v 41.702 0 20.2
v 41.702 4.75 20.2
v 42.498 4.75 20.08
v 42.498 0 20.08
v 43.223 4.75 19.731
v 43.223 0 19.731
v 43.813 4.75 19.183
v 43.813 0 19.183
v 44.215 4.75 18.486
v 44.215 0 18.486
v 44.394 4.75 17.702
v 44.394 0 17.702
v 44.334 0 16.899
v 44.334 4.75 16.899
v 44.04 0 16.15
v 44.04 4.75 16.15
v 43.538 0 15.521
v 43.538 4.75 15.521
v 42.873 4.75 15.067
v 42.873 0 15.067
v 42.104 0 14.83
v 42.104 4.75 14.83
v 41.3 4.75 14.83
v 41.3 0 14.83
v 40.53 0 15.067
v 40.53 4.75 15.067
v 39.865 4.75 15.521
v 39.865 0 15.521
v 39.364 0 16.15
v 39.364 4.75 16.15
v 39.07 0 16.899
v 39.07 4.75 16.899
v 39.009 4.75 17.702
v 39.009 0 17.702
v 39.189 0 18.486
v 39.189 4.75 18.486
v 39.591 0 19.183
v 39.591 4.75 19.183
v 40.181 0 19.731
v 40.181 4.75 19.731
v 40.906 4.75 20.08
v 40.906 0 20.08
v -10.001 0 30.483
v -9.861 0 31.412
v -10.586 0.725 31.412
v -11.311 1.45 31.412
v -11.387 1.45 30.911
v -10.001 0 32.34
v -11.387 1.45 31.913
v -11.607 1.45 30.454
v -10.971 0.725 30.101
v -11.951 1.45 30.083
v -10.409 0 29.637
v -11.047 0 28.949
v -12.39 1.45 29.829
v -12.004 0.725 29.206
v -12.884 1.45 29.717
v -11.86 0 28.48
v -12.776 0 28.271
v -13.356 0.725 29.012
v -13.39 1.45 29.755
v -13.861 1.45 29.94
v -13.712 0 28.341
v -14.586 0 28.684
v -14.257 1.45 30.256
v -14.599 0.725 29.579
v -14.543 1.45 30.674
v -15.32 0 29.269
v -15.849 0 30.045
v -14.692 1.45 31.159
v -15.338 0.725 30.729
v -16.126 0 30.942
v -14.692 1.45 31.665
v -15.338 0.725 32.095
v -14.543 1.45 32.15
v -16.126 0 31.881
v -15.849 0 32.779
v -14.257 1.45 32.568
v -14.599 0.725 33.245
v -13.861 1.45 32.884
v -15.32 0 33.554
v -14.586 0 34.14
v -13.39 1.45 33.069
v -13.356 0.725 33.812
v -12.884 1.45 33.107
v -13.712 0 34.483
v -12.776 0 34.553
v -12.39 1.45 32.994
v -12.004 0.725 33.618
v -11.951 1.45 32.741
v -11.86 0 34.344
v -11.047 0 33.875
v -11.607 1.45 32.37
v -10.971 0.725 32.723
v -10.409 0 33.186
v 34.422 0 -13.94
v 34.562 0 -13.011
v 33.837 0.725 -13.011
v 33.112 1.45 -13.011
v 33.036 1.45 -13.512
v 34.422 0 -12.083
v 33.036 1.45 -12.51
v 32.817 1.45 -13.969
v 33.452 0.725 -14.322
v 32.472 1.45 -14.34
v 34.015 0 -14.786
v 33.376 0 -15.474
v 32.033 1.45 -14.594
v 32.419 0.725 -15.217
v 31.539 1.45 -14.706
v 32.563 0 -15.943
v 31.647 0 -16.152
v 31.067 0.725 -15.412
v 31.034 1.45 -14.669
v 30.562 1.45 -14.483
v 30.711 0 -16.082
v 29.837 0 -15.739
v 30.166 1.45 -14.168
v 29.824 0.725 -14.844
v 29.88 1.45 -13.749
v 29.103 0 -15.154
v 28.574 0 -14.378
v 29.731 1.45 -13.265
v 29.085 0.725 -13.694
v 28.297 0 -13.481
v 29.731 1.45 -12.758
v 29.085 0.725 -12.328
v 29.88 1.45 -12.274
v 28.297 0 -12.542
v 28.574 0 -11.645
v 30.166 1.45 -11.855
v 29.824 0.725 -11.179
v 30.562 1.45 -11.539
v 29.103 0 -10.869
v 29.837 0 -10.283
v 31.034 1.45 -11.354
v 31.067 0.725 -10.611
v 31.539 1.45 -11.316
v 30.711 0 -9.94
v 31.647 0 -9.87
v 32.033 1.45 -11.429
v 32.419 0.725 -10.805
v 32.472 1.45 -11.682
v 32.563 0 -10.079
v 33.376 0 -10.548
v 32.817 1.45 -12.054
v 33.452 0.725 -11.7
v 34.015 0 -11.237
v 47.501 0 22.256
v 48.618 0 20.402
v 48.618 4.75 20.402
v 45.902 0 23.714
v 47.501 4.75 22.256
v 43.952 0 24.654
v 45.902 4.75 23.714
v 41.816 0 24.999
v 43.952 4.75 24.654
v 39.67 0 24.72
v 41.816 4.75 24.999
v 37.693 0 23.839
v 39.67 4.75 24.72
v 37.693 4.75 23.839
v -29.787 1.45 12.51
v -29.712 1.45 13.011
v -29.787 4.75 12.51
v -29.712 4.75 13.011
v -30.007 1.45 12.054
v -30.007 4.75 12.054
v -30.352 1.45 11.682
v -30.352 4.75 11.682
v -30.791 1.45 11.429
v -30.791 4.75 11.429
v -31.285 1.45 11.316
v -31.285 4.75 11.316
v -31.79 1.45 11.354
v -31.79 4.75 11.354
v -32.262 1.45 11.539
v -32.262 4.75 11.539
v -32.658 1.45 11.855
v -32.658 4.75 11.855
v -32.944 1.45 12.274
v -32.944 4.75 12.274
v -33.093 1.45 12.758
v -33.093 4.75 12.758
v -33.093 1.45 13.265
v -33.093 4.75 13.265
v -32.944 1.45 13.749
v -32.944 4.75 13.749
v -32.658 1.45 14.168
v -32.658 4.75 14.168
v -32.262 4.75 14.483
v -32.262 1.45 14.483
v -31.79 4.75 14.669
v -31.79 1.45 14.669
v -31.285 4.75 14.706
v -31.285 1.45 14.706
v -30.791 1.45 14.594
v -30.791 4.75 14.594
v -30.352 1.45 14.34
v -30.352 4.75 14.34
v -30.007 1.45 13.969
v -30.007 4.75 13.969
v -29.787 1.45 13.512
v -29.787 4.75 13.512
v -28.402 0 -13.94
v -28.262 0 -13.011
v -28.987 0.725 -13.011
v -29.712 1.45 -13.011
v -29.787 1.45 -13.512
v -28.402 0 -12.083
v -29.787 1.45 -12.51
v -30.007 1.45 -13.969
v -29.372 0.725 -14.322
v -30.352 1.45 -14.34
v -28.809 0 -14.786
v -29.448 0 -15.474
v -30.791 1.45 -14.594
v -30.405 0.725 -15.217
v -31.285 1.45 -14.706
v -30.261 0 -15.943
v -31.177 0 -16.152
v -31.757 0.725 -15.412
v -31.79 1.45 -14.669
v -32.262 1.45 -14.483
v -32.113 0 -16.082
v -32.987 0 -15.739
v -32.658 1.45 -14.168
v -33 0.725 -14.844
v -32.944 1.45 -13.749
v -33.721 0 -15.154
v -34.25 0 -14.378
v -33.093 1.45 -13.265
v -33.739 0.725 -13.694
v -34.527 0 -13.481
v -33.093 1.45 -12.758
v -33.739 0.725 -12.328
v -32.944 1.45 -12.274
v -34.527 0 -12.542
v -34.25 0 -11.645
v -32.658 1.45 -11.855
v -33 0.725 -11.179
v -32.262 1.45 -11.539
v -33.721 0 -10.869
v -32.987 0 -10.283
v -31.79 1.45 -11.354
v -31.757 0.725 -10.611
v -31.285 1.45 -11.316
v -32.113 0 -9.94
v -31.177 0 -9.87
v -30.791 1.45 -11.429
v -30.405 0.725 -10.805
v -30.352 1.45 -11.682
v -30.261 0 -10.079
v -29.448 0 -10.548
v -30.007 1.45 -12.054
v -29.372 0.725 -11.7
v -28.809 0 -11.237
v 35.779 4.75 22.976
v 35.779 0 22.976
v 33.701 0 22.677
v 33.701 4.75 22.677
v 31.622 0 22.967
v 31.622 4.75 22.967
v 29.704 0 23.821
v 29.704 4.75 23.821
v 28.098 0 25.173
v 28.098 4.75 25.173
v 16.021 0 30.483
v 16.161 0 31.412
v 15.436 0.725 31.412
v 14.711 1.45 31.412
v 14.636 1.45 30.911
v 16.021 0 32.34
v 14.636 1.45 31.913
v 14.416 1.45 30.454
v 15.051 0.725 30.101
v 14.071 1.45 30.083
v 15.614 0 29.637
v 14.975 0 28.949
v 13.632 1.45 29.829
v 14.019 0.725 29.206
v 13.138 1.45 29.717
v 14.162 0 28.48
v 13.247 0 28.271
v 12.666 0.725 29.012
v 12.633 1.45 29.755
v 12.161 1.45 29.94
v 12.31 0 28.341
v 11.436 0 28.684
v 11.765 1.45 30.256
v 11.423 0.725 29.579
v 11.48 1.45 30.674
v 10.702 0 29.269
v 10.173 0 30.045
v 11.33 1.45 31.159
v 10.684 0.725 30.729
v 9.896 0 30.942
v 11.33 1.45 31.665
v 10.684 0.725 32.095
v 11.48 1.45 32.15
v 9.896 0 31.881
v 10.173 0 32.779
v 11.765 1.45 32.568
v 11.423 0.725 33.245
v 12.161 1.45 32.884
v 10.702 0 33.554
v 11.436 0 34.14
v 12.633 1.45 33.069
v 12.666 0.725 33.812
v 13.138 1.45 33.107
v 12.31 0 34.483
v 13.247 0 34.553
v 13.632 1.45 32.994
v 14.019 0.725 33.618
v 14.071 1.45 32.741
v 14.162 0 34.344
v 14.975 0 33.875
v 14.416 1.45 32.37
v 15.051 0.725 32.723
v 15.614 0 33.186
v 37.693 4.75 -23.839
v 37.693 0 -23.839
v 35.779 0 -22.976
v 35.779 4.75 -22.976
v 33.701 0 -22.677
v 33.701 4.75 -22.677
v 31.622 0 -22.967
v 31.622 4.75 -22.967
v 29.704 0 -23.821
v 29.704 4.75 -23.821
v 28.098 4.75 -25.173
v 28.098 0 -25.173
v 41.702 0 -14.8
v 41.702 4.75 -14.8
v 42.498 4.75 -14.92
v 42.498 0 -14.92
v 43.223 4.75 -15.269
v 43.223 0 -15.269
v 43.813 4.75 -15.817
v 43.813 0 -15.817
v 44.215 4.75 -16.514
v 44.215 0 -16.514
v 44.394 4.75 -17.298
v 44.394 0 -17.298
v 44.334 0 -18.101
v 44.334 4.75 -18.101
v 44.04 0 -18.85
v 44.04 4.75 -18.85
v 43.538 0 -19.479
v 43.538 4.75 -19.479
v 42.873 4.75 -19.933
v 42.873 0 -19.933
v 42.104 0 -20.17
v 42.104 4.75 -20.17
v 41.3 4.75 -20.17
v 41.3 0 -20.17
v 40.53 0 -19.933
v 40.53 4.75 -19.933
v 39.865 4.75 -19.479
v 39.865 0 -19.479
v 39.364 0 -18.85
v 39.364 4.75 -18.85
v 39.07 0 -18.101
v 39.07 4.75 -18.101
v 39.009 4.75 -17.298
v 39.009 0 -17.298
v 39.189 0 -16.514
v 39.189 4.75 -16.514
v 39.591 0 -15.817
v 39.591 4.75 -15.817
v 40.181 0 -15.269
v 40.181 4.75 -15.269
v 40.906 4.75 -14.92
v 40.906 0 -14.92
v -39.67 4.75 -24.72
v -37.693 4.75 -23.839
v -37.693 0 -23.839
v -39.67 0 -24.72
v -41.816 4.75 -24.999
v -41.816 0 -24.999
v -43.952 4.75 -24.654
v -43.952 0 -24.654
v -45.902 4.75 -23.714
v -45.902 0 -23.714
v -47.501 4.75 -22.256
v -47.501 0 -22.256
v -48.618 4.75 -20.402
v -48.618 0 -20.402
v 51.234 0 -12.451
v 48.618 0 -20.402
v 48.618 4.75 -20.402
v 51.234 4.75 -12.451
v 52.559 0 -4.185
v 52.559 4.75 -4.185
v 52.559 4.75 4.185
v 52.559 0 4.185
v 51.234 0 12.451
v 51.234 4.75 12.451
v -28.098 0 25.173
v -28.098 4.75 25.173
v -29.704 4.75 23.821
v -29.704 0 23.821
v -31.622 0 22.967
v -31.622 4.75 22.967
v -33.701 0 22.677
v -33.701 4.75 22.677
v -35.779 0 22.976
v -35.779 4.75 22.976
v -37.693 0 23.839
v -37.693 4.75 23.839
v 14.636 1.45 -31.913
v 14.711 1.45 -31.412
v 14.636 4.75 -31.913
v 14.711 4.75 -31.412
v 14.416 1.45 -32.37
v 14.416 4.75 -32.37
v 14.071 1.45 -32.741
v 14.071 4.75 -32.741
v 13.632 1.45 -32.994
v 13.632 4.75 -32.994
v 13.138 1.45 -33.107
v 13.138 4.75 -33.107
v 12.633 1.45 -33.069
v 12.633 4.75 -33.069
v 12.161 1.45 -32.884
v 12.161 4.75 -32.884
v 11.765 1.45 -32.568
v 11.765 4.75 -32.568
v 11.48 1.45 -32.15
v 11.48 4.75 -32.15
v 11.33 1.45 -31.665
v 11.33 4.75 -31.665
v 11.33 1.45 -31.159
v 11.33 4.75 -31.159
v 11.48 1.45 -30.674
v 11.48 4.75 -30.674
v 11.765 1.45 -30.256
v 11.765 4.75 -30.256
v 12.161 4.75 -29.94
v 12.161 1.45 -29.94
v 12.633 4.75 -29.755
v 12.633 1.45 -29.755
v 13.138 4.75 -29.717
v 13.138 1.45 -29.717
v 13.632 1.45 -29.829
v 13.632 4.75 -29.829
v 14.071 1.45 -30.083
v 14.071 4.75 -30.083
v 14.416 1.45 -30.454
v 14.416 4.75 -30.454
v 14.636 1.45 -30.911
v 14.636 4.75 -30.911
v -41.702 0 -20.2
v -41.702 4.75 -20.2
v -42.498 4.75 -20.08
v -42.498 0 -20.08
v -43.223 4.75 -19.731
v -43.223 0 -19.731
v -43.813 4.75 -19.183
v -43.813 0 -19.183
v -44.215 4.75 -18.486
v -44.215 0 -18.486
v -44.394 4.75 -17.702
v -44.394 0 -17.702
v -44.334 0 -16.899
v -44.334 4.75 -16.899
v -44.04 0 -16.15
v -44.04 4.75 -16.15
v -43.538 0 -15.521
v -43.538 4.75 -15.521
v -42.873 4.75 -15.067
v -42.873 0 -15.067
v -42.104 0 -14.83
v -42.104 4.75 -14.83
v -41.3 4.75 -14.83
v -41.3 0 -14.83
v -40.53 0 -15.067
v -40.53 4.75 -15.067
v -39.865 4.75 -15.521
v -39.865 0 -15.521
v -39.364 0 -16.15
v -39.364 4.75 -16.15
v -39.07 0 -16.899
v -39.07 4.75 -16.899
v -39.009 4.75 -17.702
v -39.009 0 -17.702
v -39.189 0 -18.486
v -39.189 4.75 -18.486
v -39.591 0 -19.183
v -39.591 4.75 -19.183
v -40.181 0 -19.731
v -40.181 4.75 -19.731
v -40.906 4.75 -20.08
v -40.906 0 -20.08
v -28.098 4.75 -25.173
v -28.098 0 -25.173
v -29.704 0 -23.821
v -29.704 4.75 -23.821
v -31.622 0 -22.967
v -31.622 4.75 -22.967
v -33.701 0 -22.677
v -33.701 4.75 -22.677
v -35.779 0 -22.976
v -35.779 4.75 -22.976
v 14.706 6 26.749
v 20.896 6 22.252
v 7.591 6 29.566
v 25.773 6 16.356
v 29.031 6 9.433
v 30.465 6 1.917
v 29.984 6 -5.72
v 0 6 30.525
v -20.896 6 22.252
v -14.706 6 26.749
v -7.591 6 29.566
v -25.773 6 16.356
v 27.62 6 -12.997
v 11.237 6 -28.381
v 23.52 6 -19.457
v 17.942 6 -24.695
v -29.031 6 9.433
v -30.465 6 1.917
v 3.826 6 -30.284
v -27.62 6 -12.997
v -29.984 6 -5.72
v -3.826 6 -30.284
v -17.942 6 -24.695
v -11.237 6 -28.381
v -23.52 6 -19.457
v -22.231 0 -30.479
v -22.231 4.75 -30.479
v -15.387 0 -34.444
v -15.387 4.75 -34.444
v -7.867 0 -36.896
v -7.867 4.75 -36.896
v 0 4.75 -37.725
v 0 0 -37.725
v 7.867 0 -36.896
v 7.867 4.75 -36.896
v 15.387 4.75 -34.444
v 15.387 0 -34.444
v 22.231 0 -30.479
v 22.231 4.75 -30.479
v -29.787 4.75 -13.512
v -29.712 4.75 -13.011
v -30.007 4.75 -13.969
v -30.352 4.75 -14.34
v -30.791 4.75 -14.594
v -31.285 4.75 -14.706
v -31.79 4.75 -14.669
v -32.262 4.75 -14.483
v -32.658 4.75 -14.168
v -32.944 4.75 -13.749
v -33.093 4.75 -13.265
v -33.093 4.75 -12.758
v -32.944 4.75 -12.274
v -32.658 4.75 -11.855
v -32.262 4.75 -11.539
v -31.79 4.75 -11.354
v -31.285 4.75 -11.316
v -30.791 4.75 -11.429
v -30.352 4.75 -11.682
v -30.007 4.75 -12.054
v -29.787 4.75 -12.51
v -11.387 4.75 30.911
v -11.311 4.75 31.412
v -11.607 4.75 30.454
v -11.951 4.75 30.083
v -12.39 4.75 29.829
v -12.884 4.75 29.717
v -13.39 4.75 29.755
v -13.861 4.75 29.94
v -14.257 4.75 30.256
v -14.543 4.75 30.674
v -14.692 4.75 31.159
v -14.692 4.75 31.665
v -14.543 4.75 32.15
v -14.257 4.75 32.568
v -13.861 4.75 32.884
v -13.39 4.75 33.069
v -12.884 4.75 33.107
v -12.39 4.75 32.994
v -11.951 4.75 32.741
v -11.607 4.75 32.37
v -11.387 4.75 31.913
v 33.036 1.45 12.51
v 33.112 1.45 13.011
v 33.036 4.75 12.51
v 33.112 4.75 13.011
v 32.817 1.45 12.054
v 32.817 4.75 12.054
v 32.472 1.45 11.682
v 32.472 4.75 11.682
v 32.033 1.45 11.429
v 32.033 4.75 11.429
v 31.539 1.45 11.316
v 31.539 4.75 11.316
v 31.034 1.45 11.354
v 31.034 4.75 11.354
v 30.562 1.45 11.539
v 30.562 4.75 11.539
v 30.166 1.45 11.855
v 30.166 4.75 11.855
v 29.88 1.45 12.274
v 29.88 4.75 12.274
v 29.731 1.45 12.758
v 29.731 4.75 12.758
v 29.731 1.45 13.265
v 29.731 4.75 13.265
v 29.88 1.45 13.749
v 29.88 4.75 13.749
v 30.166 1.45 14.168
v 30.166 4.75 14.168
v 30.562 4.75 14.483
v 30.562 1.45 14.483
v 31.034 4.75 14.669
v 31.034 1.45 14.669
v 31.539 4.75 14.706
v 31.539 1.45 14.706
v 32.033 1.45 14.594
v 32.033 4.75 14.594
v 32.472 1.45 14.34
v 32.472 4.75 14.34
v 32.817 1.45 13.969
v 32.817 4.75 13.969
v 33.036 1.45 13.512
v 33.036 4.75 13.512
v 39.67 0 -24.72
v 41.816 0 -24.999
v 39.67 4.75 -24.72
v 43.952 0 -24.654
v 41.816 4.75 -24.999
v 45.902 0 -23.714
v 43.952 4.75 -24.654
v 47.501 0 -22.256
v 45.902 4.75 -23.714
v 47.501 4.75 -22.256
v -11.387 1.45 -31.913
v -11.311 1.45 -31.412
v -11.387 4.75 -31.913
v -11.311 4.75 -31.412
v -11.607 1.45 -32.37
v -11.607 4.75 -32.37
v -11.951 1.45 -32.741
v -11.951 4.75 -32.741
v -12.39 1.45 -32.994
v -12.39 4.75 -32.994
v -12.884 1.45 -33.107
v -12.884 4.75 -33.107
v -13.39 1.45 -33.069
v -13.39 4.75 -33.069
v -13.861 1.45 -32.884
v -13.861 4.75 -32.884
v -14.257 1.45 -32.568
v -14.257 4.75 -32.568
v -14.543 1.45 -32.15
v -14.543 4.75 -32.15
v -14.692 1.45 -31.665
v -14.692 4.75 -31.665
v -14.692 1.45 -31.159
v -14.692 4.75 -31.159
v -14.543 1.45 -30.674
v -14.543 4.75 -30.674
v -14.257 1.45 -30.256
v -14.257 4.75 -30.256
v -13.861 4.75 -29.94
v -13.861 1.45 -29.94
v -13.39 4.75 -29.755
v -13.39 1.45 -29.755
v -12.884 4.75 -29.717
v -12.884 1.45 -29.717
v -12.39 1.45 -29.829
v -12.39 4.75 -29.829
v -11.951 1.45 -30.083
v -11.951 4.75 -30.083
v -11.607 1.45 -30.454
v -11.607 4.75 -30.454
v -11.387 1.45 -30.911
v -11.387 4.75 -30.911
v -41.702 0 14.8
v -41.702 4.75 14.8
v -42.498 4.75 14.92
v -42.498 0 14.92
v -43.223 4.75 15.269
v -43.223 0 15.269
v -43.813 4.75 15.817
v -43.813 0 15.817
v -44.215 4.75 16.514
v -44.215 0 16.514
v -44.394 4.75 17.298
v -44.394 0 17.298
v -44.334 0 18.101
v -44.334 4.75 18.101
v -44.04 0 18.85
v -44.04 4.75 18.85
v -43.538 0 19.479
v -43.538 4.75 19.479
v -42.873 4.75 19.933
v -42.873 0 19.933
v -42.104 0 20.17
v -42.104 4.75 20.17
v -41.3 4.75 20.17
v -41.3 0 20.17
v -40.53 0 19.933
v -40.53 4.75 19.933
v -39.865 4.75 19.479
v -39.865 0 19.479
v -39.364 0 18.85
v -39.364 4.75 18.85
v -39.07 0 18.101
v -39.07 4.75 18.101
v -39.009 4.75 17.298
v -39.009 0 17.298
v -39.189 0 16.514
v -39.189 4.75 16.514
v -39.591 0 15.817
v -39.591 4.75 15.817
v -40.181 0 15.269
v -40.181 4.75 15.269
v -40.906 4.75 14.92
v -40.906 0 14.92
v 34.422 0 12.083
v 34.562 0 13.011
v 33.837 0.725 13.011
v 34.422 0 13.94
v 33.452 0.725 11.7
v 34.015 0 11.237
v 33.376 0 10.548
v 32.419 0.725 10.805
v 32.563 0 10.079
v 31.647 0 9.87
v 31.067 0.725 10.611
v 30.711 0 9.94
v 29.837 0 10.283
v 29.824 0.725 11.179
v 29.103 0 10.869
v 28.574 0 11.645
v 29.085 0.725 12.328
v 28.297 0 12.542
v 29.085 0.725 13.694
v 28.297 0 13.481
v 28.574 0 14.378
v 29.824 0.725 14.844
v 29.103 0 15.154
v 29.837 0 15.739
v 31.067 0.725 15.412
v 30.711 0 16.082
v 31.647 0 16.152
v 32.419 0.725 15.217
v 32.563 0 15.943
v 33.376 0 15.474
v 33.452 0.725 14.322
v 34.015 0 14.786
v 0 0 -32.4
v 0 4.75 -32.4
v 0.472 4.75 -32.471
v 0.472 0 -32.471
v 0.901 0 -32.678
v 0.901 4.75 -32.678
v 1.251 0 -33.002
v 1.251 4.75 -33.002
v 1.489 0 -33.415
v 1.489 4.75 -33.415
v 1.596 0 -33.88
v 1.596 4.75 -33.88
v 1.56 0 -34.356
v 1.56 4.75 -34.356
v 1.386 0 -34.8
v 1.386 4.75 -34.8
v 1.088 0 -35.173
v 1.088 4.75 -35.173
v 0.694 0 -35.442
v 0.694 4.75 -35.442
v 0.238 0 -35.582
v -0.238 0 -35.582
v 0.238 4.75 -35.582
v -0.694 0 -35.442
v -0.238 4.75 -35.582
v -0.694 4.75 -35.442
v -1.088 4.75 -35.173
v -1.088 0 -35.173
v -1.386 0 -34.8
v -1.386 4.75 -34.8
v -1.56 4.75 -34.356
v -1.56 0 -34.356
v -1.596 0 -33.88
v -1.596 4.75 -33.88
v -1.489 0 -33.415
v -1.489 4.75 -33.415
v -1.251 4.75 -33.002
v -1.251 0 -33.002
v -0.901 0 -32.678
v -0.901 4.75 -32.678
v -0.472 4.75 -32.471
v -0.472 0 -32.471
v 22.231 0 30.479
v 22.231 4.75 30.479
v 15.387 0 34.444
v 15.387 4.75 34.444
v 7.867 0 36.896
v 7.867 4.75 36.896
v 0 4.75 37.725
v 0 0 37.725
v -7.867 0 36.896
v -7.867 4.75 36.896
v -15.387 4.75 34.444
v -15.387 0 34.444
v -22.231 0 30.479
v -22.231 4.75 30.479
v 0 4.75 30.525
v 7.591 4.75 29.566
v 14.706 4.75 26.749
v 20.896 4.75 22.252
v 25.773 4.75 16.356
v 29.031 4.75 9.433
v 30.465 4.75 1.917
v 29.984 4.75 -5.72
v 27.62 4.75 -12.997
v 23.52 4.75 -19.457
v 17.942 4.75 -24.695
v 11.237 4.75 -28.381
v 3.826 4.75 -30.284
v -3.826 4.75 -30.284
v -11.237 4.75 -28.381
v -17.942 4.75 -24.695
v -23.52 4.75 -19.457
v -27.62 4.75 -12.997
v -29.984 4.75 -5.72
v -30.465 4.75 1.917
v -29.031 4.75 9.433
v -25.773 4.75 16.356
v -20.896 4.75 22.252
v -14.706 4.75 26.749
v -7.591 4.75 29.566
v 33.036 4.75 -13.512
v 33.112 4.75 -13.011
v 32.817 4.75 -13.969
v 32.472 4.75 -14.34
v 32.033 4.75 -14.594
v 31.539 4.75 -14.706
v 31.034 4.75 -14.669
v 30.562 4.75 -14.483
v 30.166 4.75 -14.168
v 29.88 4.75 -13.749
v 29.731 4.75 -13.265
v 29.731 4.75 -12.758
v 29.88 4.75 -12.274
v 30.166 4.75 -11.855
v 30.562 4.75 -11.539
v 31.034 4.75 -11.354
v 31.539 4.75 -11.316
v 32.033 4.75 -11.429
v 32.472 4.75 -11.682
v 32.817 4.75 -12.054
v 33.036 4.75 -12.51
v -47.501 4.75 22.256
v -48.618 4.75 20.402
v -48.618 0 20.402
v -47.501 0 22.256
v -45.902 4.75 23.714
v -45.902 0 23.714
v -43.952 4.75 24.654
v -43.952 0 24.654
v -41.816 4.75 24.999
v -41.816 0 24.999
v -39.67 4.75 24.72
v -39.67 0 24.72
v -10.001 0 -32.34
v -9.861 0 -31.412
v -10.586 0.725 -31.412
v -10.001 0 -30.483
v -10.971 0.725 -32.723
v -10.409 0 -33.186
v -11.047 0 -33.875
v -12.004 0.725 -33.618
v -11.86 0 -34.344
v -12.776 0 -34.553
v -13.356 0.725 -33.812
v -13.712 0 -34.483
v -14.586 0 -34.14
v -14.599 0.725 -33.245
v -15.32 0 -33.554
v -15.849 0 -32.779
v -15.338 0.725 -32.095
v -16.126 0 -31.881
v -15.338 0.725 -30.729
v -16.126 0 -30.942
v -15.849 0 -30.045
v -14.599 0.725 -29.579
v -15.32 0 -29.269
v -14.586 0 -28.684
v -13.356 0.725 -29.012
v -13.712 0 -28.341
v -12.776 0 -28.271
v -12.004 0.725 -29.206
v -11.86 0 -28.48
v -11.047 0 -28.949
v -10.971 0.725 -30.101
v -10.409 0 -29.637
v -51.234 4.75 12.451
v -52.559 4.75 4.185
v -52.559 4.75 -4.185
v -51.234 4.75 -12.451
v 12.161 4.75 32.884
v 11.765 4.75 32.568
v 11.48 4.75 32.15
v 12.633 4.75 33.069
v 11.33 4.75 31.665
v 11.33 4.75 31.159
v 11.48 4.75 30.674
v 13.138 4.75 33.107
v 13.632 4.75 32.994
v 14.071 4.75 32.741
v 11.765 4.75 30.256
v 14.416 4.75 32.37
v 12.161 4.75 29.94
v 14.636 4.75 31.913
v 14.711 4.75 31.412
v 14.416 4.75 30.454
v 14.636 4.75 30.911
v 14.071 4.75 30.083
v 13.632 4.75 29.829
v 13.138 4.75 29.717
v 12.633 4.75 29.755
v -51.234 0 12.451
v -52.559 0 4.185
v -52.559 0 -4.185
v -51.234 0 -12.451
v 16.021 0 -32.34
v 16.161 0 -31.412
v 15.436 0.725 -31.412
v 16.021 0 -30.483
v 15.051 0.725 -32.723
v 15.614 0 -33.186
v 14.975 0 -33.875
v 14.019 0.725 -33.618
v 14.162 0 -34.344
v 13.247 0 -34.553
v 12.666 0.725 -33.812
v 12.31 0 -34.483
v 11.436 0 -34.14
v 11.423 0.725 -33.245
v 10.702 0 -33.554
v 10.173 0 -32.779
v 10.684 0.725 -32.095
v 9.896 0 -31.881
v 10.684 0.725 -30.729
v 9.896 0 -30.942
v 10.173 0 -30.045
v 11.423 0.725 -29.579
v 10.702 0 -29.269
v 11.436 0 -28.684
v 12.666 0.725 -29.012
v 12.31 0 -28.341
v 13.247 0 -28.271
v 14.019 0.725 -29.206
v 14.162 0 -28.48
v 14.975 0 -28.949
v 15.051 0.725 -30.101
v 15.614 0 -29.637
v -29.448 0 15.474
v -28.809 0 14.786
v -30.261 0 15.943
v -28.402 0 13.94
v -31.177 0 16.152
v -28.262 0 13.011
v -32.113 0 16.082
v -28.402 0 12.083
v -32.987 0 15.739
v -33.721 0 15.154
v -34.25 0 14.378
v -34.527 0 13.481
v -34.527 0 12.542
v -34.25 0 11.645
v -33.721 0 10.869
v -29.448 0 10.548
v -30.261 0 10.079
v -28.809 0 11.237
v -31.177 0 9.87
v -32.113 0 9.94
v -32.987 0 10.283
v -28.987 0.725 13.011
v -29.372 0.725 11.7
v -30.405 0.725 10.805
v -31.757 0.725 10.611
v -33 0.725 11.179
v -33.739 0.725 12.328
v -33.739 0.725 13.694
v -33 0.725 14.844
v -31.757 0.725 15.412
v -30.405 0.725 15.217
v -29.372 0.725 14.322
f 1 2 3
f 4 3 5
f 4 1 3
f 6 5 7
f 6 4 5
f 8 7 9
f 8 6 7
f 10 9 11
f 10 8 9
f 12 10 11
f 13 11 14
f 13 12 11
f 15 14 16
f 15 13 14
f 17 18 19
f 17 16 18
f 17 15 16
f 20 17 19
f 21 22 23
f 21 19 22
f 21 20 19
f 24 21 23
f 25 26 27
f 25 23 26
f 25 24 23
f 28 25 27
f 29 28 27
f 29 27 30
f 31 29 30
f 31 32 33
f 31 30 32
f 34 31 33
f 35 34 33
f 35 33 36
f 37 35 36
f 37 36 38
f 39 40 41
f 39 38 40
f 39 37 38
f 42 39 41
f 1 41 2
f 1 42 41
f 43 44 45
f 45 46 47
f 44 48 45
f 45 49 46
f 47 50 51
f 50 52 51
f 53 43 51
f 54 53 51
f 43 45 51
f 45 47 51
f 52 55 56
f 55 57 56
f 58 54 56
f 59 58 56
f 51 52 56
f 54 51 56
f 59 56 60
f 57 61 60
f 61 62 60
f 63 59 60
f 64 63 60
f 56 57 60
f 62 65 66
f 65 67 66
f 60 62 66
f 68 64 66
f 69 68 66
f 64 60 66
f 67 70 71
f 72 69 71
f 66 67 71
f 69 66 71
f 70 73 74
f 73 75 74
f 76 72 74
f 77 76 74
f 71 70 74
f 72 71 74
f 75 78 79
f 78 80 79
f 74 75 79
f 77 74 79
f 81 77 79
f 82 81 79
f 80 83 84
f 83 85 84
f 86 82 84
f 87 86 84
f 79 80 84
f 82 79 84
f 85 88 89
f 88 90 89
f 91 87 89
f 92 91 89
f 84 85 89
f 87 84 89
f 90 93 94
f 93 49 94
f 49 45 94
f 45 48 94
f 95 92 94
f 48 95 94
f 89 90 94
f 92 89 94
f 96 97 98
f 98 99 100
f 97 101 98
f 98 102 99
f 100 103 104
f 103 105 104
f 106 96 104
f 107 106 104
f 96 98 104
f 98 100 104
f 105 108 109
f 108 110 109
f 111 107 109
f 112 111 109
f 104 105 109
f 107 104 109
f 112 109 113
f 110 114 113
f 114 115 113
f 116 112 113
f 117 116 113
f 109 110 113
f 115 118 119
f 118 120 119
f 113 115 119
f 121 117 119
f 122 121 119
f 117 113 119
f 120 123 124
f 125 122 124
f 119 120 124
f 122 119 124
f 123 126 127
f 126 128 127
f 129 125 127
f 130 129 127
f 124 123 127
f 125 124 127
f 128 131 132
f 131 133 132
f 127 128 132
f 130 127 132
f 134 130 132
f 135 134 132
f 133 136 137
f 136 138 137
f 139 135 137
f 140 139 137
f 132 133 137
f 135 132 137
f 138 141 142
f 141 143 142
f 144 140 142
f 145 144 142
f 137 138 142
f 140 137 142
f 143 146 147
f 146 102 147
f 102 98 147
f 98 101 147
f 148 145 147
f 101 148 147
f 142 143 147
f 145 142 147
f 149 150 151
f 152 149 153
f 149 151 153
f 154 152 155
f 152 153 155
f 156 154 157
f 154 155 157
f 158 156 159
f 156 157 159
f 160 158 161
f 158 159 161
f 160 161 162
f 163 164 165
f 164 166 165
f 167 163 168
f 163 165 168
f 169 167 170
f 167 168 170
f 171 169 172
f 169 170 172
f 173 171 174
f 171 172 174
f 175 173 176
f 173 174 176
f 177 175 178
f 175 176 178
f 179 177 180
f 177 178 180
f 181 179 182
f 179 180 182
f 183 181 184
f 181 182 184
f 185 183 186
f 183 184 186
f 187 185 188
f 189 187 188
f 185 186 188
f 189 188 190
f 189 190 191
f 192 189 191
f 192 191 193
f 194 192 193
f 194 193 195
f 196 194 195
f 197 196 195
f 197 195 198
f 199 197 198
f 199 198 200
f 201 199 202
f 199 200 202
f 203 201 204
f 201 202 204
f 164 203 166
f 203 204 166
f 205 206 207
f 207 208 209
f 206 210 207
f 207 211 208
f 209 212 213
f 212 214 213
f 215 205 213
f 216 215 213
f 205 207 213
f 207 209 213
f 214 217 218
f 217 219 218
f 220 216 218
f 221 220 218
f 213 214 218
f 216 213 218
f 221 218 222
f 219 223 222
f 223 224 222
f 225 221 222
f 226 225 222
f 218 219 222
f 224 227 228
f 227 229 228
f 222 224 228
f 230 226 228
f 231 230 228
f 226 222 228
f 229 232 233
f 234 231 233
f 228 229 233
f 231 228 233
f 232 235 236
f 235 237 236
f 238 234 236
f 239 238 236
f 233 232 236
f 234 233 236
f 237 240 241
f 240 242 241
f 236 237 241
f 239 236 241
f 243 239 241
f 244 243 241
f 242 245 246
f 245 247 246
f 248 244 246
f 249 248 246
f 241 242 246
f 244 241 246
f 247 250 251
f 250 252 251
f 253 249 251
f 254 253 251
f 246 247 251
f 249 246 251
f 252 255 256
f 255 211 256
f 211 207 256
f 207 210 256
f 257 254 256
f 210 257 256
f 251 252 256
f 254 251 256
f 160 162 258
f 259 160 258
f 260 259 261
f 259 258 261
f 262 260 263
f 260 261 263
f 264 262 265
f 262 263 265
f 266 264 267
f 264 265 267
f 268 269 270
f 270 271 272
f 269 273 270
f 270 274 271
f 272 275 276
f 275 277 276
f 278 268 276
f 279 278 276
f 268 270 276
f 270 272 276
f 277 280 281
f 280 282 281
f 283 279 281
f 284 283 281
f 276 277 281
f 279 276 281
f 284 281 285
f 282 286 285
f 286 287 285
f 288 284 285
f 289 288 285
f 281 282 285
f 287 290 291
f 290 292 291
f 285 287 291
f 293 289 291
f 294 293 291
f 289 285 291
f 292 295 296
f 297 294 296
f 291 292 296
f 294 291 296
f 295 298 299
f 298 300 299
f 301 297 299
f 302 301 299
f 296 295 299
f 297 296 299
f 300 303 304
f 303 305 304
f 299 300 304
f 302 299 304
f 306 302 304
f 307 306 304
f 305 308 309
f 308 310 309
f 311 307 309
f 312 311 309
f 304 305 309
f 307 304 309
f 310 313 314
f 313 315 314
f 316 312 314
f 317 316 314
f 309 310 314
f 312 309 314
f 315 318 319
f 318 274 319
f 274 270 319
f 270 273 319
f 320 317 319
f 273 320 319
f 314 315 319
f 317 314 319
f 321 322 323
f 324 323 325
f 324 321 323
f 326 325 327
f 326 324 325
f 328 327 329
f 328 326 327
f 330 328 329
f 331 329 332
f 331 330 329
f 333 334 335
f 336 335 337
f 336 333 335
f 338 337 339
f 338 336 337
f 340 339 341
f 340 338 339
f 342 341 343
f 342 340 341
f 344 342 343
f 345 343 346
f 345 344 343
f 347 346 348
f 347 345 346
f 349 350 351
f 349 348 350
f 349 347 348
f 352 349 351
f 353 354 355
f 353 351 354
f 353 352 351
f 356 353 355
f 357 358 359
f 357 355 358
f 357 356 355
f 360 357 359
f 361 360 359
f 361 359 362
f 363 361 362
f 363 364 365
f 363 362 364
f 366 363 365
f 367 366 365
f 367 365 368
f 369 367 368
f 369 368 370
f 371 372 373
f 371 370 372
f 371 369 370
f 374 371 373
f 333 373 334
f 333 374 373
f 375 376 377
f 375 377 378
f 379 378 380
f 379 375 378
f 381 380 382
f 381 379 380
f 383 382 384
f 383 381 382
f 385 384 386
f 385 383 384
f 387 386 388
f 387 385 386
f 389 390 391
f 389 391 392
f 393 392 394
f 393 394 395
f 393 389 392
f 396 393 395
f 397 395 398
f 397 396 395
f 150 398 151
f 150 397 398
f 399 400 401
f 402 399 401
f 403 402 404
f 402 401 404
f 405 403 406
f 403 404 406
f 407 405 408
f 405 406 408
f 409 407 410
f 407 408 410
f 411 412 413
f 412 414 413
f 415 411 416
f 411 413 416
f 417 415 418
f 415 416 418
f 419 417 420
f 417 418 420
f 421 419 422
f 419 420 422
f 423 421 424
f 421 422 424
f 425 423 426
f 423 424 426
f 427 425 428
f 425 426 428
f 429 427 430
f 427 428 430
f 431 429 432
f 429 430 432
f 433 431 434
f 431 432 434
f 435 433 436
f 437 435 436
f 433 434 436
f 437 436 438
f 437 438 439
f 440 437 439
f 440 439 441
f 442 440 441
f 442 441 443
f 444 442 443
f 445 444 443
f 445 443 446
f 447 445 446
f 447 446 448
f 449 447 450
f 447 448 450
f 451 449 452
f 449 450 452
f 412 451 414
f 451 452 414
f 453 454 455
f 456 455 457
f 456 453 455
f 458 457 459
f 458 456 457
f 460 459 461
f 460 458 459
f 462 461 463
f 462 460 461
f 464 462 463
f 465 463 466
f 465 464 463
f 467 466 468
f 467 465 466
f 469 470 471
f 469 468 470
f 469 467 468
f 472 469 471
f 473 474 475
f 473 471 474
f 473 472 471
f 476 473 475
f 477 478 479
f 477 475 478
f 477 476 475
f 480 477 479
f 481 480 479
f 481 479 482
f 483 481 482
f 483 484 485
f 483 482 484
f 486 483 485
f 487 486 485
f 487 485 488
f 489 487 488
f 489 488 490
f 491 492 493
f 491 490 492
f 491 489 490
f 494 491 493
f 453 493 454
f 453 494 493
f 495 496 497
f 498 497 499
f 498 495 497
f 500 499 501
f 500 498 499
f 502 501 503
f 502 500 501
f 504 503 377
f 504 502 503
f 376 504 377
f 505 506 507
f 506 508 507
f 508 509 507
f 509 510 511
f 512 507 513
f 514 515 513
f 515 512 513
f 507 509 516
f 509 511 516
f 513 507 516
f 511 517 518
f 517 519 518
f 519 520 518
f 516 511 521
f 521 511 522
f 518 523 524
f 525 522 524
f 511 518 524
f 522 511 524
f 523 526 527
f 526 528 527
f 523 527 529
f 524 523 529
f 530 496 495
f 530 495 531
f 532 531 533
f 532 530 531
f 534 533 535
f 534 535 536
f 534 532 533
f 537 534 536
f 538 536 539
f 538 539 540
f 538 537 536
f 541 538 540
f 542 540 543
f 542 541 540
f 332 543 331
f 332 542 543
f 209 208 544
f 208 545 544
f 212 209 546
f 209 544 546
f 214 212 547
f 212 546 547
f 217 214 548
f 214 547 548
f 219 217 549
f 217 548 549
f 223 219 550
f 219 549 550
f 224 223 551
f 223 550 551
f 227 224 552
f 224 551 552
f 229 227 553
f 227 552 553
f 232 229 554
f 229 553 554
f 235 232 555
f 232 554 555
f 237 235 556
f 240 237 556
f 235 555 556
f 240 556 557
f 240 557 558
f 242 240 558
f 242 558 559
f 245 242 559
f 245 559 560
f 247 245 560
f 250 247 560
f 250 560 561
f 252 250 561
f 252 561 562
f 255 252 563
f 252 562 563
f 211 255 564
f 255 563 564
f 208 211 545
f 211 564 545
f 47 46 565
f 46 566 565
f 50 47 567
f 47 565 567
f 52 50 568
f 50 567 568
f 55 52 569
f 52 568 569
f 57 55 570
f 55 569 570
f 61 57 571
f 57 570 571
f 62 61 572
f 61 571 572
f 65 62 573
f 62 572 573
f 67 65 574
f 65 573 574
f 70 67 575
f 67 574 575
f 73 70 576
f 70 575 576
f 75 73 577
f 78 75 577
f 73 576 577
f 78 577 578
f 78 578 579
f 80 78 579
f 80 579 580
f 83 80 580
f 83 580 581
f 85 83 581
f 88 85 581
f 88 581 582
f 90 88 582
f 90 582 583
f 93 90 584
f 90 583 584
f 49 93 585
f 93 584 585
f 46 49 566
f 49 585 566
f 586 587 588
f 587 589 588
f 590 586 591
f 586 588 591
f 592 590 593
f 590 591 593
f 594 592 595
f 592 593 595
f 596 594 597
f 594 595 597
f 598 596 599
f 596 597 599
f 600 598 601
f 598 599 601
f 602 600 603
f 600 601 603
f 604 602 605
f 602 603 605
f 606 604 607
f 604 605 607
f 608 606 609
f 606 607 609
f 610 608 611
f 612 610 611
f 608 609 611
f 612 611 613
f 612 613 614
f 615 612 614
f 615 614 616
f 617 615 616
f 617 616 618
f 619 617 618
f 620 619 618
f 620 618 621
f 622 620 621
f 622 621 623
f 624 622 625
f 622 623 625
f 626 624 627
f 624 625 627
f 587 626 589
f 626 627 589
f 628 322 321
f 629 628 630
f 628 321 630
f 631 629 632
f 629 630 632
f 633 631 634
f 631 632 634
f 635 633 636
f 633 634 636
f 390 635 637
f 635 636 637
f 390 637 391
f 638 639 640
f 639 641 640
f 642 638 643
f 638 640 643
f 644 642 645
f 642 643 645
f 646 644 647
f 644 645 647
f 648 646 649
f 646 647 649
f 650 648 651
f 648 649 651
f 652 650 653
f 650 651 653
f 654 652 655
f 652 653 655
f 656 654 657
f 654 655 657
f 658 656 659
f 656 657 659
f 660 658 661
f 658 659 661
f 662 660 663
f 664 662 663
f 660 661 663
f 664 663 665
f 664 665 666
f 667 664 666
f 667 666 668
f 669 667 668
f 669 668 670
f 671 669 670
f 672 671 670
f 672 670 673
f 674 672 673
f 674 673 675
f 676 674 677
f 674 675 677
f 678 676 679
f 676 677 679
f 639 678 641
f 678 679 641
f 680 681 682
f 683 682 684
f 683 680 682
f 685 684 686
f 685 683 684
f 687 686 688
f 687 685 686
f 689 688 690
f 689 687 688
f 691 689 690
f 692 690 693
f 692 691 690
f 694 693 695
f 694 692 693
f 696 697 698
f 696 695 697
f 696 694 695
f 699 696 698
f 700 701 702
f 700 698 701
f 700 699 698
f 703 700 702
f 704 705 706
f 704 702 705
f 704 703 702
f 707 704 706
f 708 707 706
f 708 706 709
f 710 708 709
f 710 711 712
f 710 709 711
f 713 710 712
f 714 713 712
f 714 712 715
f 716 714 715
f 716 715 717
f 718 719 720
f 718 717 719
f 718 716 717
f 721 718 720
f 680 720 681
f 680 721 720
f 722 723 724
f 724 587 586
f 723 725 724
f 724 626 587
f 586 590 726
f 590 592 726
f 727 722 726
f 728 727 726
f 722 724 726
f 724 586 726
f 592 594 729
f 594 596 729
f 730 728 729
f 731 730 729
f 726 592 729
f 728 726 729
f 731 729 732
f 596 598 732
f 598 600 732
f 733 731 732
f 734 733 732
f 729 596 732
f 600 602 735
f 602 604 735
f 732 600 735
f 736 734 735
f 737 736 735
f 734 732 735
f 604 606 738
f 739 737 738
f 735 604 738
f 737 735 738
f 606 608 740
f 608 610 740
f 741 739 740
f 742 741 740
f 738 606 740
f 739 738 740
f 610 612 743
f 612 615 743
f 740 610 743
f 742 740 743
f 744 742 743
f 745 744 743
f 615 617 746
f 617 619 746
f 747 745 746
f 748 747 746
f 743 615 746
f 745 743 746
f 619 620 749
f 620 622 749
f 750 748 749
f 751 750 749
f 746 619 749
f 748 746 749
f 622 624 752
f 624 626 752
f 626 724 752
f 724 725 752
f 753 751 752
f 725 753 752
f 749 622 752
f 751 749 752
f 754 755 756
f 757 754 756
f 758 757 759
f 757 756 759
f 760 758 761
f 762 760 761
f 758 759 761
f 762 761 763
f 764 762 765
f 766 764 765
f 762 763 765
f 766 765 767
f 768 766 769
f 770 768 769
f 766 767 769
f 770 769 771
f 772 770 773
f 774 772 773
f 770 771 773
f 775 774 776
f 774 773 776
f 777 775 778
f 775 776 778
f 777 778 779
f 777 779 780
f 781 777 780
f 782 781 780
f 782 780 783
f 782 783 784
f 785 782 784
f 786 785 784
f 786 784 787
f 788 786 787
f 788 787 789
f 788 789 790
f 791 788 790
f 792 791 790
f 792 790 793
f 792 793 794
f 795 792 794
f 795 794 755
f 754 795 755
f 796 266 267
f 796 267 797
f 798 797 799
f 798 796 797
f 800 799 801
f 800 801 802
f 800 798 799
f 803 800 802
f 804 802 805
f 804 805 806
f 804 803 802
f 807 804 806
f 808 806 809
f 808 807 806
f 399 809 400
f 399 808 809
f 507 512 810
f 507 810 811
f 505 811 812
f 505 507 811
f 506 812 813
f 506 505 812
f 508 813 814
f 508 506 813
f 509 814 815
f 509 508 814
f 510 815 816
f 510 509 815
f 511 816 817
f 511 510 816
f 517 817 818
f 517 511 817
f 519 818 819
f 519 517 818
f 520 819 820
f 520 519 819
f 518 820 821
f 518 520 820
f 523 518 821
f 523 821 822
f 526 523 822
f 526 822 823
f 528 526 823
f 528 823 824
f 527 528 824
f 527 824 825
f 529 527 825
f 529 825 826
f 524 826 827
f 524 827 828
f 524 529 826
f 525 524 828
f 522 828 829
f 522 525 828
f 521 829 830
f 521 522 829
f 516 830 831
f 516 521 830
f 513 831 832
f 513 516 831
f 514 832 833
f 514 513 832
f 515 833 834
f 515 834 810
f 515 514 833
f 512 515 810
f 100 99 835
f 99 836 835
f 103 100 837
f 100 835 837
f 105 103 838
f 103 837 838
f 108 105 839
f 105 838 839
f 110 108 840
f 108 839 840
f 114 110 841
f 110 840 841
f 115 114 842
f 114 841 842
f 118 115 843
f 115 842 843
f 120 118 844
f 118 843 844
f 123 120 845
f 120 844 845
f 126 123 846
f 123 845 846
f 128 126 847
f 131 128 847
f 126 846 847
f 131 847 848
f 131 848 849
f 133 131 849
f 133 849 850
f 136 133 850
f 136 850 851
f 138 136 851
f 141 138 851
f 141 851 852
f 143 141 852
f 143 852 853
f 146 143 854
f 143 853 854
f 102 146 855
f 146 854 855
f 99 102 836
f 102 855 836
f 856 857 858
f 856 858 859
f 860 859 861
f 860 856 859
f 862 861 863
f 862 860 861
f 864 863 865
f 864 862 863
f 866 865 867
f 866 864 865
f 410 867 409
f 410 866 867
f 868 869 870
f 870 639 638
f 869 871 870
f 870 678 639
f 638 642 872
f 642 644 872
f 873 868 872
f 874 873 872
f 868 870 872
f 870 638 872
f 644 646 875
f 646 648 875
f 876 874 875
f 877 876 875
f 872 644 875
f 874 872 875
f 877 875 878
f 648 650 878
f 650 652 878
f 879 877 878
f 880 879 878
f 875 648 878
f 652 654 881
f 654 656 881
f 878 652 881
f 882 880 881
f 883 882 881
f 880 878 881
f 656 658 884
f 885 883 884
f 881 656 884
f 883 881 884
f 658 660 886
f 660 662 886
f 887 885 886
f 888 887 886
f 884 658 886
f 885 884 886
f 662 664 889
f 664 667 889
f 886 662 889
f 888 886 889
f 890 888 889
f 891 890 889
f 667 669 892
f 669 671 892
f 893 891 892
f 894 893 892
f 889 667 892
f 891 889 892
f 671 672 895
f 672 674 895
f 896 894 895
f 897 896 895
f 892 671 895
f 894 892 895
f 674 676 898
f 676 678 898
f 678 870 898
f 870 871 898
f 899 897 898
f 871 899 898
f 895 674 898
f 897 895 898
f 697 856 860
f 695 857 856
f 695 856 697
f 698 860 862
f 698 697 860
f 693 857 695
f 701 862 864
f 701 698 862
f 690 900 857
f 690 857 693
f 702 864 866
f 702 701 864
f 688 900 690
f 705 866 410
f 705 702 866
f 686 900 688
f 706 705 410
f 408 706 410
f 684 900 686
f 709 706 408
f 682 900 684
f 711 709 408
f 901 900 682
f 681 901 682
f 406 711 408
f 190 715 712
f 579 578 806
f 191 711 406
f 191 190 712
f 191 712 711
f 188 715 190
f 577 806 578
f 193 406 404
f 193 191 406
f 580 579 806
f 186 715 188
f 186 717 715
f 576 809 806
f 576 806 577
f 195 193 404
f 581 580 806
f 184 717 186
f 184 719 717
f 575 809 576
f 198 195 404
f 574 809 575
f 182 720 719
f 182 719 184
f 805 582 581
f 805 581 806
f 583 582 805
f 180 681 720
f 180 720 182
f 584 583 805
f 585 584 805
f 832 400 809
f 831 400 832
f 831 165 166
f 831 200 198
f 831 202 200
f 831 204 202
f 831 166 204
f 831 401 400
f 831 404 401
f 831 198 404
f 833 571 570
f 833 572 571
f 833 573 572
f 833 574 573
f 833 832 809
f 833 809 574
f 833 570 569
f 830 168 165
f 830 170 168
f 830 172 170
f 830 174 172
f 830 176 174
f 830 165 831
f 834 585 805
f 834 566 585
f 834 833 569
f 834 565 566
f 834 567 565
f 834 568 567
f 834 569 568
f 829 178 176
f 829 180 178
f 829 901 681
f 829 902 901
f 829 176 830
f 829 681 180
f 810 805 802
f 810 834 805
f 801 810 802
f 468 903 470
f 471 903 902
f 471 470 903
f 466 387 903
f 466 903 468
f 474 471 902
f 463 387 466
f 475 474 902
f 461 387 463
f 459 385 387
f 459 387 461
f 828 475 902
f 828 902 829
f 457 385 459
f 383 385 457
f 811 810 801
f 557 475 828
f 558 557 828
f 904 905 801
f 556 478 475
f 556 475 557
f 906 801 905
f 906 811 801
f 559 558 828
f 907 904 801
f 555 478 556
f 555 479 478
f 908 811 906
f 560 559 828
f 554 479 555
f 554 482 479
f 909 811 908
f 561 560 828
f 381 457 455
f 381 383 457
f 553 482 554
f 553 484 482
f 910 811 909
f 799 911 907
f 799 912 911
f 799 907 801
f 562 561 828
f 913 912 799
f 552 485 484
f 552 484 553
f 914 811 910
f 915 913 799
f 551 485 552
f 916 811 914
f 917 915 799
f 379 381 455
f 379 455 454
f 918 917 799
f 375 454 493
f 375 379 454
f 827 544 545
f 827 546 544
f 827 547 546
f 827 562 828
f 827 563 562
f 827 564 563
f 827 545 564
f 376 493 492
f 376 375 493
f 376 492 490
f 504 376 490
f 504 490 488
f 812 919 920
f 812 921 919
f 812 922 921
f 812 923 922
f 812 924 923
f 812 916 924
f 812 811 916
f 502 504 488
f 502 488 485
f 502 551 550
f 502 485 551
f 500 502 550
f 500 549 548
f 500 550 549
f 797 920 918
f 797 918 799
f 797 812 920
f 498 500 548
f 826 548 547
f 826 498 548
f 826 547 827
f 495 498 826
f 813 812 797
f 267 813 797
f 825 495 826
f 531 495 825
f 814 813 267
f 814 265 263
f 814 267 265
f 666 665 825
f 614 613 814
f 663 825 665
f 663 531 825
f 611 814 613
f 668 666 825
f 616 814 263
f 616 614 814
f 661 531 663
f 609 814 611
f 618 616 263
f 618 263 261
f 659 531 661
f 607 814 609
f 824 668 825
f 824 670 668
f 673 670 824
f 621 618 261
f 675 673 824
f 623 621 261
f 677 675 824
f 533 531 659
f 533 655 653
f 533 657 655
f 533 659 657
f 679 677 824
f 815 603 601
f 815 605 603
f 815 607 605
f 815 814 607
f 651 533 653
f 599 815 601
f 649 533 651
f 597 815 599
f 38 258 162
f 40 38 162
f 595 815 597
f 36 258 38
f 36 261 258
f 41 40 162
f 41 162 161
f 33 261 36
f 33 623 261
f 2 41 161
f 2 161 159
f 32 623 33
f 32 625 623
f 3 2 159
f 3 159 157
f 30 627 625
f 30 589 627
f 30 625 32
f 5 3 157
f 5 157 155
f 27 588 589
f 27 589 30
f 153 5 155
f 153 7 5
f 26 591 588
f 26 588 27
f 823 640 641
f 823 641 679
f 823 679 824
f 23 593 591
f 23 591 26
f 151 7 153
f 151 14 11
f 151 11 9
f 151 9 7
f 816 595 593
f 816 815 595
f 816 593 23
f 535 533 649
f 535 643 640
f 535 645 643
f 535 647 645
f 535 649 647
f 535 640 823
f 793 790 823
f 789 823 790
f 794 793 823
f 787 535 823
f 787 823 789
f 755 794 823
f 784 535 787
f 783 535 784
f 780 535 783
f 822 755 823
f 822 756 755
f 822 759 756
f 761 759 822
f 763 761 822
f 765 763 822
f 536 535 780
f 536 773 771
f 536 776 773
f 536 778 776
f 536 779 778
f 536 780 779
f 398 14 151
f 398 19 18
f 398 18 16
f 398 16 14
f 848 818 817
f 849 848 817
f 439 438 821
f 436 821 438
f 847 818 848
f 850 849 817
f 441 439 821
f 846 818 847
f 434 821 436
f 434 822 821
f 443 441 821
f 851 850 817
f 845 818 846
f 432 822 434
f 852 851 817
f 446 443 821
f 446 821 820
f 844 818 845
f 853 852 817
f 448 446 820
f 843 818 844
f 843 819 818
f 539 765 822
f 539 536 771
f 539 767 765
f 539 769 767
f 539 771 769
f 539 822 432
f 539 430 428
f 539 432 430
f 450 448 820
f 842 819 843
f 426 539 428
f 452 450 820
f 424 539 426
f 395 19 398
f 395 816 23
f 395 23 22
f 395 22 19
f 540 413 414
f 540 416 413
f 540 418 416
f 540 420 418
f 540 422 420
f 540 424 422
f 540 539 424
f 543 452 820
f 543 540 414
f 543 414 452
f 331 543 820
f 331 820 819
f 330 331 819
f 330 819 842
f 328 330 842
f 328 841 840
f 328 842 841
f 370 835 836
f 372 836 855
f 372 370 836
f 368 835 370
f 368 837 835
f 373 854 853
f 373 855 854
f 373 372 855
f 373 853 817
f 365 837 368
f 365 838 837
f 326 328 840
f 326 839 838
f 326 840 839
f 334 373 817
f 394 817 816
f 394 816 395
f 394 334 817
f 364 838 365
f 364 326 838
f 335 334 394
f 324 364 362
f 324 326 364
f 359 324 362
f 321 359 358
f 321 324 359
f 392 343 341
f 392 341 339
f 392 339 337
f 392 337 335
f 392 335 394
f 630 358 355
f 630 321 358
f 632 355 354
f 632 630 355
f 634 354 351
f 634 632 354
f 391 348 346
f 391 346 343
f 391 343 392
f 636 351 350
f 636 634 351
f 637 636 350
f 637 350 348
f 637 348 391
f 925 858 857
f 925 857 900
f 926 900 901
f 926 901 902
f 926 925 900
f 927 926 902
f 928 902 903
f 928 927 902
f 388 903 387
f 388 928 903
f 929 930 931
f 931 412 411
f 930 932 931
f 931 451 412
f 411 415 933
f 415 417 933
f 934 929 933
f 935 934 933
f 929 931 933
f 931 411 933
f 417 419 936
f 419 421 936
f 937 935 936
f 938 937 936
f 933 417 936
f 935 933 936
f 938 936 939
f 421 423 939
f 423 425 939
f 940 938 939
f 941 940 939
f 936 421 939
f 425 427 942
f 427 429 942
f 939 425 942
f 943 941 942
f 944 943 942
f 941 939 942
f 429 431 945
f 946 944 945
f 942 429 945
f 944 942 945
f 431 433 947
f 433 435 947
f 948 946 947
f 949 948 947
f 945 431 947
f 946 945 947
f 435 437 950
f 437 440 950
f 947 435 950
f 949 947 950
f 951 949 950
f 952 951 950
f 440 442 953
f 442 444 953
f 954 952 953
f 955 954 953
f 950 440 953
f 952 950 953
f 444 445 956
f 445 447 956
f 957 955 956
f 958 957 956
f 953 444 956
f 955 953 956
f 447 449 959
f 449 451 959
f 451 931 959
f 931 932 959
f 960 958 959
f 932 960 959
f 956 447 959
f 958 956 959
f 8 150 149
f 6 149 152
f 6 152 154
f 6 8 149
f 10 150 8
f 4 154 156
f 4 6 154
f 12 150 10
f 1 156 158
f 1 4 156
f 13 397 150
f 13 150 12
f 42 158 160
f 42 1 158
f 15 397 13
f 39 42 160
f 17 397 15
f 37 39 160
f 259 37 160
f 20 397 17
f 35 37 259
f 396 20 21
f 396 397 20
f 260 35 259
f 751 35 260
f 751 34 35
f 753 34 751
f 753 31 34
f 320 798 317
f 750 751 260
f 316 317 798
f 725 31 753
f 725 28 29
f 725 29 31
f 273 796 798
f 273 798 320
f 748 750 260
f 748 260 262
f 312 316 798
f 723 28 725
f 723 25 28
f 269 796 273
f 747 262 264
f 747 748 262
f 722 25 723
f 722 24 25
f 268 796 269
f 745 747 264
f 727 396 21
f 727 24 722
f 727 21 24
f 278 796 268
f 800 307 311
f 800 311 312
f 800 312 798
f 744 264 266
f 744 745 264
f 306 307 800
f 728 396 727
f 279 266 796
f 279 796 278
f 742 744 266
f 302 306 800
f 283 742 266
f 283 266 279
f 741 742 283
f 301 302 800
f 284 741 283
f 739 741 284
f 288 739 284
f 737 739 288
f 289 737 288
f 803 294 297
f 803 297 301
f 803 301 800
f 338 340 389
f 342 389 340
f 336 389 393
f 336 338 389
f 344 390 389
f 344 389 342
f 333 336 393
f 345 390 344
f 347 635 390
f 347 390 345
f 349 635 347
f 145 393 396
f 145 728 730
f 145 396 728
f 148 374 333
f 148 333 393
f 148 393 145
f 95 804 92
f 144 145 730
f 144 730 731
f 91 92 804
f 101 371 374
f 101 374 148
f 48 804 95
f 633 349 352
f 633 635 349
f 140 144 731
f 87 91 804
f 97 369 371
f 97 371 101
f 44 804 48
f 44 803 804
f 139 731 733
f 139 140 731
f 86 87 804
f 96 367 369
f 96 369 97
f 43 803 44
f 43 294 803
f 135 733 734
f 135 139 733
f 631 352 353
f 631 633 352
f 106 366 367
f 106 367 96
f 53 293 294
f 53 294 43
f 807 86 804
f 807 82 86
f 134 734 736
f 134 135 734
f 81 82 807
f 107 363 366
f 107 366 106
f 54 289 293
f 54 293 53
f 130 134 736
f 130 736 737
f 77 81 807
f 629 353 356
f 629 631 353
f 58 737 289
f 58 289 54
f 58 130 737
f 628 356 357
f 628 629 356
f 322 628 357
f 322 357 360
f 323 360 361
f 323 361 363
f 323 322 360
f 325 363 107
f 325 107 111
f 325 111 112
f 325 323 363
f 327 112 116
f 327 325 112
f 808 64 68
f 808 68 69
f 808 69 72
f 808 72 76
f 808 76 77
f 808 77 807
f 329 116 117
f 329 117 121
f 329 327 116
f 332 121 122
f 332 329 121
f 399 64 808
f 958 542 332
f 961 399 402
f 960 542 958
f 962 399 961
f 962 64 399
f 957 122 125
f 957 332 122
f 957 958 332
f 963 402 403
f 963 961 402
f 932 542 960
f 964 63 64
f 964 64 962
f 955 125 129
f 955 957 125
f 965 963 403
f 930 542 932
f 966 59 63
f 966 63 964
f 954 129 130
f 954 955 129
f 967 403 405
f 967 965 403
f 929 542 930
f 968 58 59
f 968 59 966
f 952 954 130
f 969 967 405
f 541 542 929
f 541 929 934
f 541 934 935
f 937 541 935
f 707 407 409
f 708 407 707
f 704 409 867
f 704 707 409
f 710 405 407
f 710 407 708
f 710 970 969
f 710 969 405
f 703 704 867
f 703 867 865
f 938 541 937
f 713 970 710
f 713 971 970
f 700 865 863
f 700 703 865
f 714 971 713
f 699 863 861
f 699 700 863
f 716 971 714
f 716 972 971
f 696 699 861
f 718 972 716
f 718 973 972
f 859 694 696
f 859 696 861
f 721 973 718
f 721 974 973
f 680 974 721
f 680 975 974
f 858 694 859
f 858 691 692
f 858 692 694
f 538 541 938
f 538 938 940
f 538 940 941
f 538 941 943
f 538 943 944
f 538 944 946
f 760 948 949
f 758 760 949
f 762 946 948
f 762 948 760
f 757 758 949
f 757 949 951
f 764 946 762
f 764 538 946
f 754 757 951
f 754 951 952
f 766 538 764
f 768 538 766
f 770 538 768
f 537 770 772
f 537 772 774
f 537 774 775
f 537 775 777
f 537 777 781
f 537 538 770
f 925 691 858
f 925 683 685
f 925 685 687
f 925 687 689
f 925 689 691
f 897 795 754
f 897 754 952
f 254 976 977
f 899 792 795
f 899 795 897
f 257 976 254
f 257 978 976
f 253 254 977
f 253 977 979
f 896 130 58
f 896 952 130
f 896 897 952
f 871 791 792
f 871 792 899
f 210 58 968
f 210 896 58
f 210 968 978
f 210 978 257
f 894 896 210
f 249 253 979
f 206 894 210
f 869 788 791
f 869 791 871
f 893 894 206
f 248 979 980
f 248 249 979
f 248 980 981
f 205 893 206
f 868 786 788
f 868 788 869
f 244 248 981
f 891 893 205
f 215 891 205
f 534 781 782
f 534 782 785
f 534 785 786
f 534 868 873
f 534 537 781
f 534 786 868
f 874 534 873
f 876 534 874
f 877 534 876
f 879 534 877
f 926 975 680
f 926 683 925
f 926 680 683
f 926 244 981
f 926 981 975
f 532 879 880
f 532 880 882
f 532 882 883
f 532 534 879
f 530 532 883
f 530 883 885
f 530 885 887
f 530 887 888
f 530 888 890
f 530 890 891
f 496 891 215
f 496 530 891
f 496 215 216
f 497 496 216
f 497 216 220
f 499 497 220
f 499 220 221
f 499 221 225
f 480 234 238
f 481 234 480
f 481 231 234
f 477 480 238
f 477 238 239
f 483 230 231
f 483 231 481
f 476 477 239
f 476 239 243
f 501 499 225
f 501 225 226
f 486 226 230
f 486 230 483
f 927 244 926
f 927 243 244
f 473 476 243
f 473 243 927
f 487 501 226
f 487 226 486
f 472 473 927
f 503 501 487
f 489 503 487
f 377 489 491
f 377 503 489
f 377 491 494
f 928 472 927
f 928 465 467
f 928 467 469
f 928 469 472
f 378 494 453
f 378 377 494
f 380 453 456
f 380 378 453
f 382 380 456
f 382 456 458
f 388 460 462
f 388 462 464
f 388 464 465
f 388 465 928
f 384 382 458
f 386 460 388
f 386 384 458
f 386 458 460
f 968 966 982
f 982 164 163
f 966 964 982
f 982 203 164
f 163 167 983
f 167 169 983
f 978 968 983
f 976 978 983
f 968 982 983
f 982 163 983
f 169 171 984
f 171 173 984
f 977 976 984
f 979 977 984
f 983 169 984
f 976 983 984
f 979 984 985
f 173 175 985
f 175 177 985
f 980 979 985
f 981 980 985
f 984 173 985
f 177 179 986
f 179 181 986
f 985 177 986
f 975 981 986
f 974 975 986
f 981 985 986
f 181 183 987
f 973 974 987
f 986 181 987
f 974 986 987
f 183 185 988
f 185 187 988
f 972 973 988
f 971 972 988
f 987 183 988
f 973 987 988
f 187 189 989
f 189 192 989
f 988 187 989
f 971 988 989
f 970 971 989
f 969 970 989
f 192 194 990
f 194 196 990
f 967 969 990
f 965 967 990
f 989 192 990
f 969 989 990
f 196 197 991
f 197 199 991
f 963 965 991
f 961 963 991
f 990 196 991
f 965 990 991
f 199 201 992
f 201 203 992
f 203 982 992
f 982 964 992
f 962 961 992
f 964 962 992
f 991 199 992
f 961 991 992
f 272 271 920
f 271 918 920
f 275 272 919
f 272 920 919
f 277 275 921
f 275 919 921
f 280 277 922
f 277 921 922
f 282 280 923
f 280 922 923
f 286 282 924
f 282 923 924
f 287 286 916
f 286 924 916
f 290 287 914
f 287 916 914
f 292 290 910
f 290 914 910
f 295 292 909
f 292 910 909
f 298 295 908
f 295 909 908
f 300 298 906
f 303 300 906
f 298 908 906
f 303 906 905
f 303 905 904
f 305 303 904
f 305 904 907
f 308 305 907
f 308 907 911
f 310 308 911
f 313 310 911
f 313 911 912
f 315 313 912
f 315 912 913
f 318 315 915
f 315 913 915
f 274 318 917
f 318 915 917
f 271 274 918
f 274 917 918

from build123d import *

# Parameters (mm, degrees)
SKETCH1_R                                       = 1
SKETCH1_R_2                                     = 2.7
BOSS_EXTRUDE1_DEPTH                             = 6
FILLET1_R                                       = 7.5
SKETCH2_R                                       = 1.6
CUT_EXTRUDE1_DEPTH                              = 66.108380797
SKETCH3_OUTSIDE_W                               = 133.41
SKETCH3_OUTSIDE_H                               = 103.41
SKETCH3_OUTSIDE_R                               = 30.525
CUT_EXTRUDE3_DEPTH                              = 1.25
CSK_FOR_M3_FLAT_HEAD_MACHINE_SCREW1_D           = 3.4
CSK_FOR_M3_FLAT_HEAD_MACHINE_SCREW1_CSINK_D     = 6.3
CSK_FOR_M3_FLAT_HEAD_MACHINE_SCREW1_CSINK_ANGLE = 90


with BuildPart() as part:
    # Sketch1 → Boss-Extrude1 (new body)
    with BuildSketch(Plane(origin=(0, 0, 0), x_dir=(1, 0, 0), z_dir=(0, 1, 0))):
        with BuildLine():
            Line((31.883633055, 20.164562188), (44.561021943, 28.182280752))
            ThreePointArc((44.561021943, 28.182280752), (52.725, 0), (44.561021943, -28.182280752))
            Line((44.561021943, -28.182280752), (31.883633055, -20.164562188))
            ThreePointArc((31.883633055, -20.164562188), (0, -37.725), (-31.883633055, -20.164562188))
            Line((-31.883633055, -20.164562188), (-44.561021943, -28.182280752))
            ThreePointArc((-44.561021943, -28.182280752), (-52.725, 0), (-44.561021943, 28.182280752))
            Line((-44.561021943, 28.182280752), (-31.883633055, 20.164562188))
            ThreePointArc((-31.883633055, 20.164562188), (0, 37.725), (31.883633055, 20.164562188))
        make_face()
        with Locations(Location((-13.0112367, 31.411904105, 0), (0, 0, 270))):
            Circle(SKETCH1_R, mode=Mode.SUBTRACT)
        with Locations(Location((13.0112367, 31.411904105, 0), (0, 0, 270))):
            Circle(SKETCH1_R, mode=Mode.SUBTRACT)
        with Locations(Location((31.411904105, 13.0112367, 0), (0, 0, 270))):
            Circle(SKETCH1_R, mode=Mode.SUBTRACT)
        with Locations(Location((31.411904105, -13.0112367, 0), (0, 0, 270))):
            Circle(SKETCH1_R, mode=Mode.SUBTRACT)
        with Locations(Location((13.0112367, -31.411904105, 0), (0, 0, 270))):
            Circle(SKETCH1_R, mode=Mode.SUBTRACT)
        with Locations(Location((-13.0112367, -31.411904105, 0), (0, 0, 270))):
            Circle(SKETCH1_R, mode=Mode.SUBTRACT)
        with Locations(Location((-31.411904105, -13.0112367, 0), (0, 0, 270))):
            Circle(SKETCH1_R, mode=Mode.SUBTRACT)
        with Locations(Location((-31.411904105, 13.0112367, 0), (0, 0, 270))):
            Circle(SKETCH1_R, mode=Mode.SUBTRACT)
        with Locations(Location((41.701925915, 17.5, 0), (0, 0, 270))):
            Circle(SKETCH1_R_2, mode=Mode.SUBTRACT)
        with Locations(Location((41.701925915, -17.5, 0), (0, 0, 270))):
            Circle(SKETCH1_R_2, mode=Mode.SUBTRACT)
        with Locations(Location((-41.701925915, 17.5, 0), (0, 0, 90))):
            Circle(SKETCH1_R_2, mode=Mode.SUBTRACT)
        with Locations(Location((-41.701925915, -17.5, 0), (0, 0, 90))):
            Circle(SKETCH1_R_2, mode=Mode.SUBTRACT)
    extrude(amount=BOSS_EXTRUDE1_DEPTH)

    # Fillet1
    fillet1_edges = [part.edges().sort_by_distance(p)[0] for p in [
        (44.561021943, 3, 28.182280752),
        (31.883633055, 3, 20.164562188),
        (-44.561021943, 3, 28.182280752),
        (-31.883633055, 3, 20.164562188),
        (44.561021943, 3, -28.182280752),
        (31.883633055, 3, -20.164562188),
        (-44.561021943, 3, -28.182280752),
        (-31.883633055, 3, -20.164562188),
    ]]
    fillet(fillet1_edges, radius=FILLET1_R - 0.0001)  # a hair under: the kernel refuses the full size

    # Sketch2 → Cut-Extrude1 (cut, through all)
    with BuildSketch(Plane(origin=(0, 6, 0), x_dir=(1, 0, 0), z_dir=(0, 1, 0))):
        with Locations(Location((0, 34, 0), (0, 0, 270))):
            Circle(SKETCH2_R)
    extrude(amount=-CUT_EXTRUDE1_DEPTH, mode=Mode.SUBTRACT)

    # Sketch3 outside → Cut-Extrude3 (cut)
    with BuildSketch(Plane(origin=(0, 6, 0), x_dir=(1, 0, 0), z_dir=(0, 1, 0))):
        Rectangle(SKETCH3_OUTSIDE_W, SKETCH3_OUTSIDE_H)
        with Locations(Location((0, 0, 0), (0, 0, 270))):
            Circle(SKETCH3_OUTSIDE_R, mode=Mode.SUBTRACT)
    extrude(amount=-CUT_EXTRUDE3_DEPTH, mode=Mode.SUBTRACT)

    # CSK for M3 Flat Head Machine Screw1 (through all)
    with Locations(Plane(origin=(0, 0, 0), x_dir=(-1, 0, 0), z_dir=(0, -1, 0))):
        with Locations((13.0112367, -31.411904105), (-13.0112367, -31.411904105), (-31.411904105, -13.0112367), (-31.411904105, 13.0112367), (-13.0112367, 31.411904105), (13.0112367, 31.411904105), (31.411904105, 13.0112367), (31.411904105, -13.0112367)):
            CounterSinkHole(CSK_FOR_M3_FLAT_HEAD_MACHINE_SCREW1_D / 2, CSK_FOR_M3_FLAT_HEAD_MACHINE_SCREW1_CSINK_D / 2, counter_sink_angle=CSK_FOR_M3_FLAT_HEAD_MACHINE_SCREW1_CSINK_ANGLE)


solid = part.part
